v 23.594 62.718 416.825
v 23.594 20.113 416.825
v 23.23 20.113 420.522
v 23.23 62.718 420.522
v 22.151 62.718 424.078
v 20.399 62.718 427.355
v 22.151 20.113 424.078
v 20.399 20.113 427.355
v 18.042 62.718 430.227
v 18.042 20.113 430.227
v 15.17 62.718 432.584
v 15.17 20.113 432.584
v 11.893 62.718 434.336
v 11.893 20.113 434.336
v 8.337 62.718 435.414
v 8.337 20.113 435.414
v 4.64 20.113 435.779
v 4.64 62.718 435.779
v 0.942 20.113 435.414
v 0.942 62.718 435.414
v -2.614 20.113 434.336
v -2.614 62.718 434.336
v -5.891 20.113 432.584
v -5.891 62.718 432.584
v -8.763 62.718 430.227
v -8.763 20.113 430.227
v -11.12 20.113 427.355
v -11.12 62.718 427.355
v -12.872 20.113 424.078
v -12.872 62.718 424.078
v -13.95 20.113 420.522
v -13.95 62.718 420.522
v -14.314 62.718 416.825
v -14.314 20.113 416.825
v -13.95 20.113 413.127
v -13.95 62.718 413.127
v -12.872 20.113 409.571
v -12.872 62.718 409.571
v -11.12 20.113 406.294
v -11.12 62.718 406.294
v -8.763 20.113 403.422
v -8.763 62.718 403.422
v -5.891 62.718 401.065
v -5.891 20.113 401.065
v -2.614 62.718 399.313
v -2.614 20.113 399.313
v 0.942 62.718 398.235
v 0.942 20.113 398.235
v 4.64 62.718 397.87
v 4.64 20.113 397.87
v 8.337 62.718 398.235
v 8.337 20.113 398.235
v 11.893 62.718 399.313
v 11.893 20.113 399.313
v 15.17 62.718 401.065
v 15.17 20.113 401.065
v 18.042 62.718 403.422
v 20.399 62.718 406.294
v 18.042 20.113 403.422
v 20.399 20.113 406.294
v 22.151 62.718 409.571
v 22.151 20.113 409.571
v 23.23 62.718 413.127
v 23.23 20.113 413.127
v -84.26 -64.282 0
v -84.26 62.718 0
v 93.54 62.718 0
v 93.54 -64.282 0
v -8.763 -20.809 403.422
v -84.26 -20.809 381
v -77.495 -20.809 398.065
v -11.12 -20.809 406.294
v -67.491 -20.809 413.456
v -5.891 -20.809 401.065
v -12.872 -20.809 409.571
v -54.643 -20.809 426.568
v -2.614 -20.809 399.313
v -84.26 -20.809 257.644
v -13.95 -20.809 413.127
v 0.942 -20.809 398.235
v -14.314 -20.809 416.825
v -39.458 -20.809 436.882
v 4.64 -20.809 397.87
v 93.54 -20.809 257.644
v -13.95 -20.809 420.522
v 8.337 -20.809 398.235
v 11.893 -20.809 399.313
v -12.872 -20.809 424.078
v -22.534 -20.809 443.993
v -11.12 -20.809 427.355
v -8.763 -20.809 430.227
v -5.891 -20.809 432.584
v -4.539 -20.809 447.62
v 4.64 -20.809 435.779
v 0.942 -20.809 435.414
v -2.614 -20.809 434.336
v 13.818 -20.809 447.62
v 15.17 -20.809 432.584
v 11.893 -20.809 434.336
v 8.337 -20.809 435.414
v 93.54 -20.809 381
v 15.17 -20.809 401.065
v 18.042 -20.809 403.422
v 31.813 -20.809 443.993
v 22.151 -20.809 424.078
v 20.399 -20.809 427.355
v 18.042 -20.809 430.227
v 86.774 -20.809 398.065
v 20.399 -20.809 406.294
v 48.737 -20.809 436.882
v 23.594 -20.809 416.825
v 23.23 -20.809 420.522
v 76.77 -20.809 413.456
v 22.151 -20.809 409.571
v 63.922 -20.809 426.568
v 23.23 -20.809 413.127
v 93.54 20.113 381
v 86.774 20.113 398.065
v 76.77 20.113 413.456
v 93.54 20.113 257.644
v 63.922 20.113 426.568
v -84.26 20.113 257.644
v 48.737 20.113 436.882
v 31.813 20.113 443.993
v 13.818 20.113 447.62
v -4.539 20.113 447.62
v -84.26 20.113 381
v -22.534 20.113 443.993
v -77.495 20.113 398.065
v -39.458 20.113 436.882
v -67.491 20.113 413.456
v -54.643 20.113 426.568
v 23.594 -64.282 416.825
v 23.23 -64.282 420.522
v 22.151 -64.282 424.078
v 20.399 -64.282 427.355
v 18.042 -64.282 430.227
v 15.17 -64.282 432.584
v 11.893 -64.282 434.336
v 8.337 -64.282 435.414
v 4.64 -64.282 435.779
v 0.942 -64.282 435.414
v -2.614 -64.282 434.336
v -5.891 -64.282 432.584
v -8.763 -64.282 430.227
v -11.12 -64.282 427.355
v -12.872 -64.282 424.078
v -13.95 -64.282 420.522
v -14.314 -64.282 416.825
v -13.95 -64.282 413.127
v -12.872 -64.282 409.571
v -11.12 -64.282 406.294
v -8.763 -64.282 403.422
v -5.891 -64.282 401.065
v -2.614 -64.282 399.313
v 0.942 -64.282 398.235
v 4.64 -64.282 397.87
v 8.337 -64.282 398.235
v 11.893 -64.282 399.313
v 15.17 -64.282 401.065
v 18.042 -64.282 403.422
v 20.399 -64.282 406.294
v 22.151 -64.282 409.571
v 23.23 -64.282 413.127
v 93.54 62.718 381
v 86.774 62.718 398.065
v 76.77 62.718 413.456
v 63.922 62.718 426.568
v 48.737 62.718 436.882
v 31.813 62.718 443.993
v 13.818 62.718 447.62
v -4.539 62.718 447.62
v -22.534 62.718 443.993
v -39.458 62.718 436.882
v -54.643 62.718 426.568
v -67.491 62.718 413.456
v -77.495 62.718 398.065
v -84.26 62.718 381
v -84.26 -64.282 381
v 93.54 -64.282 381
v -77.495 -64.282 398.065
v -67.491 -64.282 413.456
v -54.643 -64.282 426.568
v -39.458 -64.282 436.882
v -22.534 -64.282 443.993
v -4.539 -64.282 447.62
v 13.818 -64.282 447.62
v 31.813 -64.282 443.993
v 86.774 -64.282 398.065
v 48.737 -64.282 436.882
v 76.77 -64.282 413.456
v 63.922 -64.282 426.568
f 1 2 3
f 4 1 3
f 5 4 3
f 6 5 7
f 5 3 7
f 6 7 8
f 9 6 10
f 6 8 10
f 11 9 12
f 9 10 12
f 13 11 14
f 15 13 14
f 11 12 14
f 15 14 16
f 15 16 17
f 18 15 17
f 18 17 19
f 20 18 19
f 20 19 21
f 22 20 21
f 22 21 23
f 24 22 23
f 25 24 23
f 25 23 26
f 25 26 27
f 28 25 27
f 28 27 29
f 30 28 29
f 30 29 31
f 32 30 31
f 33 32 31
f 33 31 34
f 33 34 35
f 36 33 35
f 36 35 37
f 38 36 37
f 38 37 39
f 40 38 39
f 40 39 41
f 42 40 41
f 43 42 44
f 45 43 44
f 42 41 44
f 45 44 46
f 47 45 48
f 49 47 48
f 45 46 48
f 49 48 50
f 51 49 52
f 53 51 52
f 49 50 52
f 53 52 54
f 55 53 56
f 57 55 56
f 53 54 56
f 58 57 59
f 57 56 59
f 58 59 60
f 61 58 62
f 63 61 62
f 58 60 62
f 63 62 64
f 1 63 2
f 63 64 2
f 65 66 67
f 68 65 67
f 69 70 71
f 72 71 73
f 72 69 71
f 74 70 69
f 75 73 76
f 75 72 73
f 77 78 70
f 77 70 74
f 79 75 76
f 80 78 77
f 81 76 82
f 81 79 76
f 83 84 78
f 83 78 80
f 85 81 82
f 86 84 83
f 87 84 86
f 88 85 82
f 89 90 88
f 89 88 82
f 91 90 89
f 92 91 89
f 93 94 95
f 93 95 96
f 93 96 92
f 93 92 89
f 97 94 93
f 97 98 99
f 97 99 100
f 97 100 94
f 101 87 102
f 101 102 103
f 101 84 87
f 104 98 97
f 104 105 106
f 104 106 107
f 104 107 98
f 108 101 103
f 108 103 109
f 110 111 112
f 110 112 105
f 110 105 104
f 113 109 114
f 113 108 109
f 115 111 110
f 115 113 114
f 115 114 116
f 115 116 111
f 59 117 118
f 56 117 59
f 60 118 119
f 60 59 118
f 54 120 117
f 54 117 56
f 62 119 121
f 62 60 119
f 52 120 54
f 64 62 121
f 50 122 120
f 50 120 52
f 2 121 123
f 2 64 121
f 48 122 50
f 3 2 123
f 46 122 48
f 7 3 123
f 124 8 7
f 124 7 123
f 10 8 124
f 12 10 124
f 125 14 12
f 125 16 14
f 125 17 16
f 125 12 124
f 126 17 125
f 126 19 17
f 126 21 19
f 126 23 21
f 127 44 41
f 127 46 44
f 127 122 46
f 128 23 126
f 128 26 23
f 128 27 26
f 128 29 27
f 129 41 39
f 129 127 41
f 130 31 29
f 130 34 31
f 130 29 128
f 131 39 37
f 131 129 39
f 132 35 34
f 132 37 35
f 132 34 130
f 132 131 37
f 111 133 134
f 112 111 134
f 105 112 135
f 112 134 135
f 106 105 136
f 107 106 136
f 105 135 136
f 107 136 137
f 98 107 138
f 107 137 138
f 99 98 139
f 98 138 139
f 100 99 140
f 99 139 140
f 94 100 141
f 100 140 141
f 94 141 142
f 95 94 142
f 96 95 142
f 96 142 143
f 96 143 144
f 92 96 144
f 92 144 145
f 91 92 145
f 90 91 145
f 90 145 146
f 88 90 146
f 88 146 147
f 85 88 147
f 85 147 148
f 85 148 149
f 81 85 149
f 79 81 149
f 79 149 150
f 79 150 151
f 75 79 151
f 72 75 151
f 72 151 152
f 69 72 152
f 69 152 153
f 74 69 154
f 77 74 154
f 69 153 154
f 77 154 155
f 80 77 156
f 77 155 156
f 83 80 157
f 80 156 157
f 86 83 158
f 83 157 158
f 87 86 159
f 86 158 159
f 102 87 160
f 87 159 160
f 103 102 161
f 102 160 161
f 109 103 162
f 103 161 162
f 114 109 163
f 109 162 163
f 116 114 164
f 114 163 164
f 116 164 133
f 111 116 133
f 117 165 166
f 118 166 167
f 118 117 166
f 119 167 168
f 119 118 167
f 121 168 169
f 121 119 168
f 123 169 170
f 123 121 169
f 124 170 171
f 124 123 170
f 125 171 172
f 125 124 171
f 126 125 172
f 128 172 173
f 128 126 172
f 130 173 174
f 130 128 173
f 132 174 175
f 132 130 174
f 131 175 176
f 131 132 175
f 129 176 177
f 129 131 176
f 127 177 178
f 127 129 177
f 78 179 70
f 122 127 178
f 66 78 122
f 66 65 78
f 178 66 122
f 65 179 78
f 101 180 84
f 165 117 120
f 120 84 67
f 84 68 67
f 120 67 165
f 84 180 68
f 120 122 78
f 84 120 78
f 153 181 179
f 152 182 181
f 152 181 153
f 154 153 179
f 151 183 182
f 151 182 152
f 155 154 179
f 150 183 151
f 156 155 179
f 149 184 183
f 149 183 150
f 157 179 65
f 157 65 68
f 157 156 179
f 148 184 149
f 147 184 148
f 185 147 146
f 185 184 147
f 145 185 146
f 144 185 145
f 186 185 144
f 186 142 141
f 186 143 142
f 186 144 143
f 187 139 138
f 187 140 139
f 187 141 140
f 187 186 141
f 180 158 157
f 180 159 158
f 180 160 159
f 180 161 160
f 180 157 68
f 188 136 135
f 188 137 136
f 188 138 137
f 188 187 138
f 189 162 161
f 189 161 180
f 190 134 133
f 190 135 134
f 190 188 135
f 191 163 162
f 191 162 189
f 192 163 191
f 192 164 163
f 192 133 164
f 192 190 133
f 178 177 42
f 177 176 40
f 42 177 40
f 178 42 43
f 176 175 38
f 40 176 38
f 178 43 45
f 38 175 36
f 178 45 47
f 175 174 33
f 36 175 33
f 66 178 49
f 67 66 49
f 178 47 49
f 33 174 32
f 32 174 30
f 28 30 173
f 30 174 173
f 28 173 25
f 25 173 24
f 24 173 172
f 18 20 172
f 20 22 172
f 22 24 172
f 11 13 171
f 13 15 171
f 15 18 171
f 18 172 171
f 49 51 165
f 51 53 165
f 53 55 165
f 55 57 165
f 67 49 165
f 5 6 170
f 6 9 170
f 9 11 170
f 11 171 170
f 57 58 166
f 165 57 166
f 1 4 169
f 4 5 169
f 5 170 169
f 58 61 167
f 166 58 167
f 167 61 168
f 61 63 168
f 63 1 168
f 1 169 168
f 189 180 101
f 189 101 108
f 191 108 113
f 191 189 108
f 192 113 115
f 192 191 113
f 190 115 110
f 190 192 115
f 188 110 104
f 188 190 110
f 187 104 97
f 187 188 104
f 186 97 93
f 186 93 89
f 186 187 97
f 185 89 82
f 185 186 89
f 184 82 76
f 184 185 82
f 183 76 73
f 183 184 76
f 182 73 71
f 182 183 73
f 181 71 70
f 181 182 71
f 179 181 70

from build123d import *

# Parameters (mm, degrees)
F0_W     = 177.8
F0_H     = 127
F1_DEPTH = 381
F2_R     = 18.95411
F3_DEPTH = 127
F4_W     = 40.922687
F4_H     = 69.383157
F5_DEPTH = 254
F6_W     = 40.922687
F6_H     = 123.355615
F7_DEPTH = 254


with BuildPart() as f1:
    # F0 (on Top) → F1 (new body)
    with BuildSketch(Plane.XY):
        with Locations((4.63968, -0.782099)):
            Rectangle(F0_W, F0_H)
    extrude(amount=F1_DEPTH)

    # F2 (on face) → F3 (join)
    with BuildSketch(Plane.XZ.offset(64.282099)):
        with BuildLine():
            Line((-84.26032, 381), (93.53968, 381))
            ThreePointArc((93.53968, 381), (4.63968, 448.077188), (-84.26032, 381))
        make_face()
        with Locations((4.63968, 416.82452)):
            Circle(F2_R, mode=Mode.SUBTRACT)
    extrude(amount=-F3_DEPTH)

    # F4 (on face) → F5 (cut)
    with BuildSketch(Plane.YZ.offset(93.53968)):
        with Locations((-0.347936, 415.691578)):
            Rectangle(F4_W, F4_H)
    extrude(amount=-F5_DEPTH, mode=Mode.SUBTRACT)

    # F6 (on face) → F7 (cut)
    with BuildSketch(Plane(origin=(-84.26032, 0, 0), x_dir=(0, -1, 0), z_dir=(-1, 0, 0))):
        with Locations((0.347936, 319.322193)):
            Rectangle(F6_W, F6_H)
    extrude(amount=-F7_DEPTH, mode=Mode.SUBTRACT)


solid = f1.part
